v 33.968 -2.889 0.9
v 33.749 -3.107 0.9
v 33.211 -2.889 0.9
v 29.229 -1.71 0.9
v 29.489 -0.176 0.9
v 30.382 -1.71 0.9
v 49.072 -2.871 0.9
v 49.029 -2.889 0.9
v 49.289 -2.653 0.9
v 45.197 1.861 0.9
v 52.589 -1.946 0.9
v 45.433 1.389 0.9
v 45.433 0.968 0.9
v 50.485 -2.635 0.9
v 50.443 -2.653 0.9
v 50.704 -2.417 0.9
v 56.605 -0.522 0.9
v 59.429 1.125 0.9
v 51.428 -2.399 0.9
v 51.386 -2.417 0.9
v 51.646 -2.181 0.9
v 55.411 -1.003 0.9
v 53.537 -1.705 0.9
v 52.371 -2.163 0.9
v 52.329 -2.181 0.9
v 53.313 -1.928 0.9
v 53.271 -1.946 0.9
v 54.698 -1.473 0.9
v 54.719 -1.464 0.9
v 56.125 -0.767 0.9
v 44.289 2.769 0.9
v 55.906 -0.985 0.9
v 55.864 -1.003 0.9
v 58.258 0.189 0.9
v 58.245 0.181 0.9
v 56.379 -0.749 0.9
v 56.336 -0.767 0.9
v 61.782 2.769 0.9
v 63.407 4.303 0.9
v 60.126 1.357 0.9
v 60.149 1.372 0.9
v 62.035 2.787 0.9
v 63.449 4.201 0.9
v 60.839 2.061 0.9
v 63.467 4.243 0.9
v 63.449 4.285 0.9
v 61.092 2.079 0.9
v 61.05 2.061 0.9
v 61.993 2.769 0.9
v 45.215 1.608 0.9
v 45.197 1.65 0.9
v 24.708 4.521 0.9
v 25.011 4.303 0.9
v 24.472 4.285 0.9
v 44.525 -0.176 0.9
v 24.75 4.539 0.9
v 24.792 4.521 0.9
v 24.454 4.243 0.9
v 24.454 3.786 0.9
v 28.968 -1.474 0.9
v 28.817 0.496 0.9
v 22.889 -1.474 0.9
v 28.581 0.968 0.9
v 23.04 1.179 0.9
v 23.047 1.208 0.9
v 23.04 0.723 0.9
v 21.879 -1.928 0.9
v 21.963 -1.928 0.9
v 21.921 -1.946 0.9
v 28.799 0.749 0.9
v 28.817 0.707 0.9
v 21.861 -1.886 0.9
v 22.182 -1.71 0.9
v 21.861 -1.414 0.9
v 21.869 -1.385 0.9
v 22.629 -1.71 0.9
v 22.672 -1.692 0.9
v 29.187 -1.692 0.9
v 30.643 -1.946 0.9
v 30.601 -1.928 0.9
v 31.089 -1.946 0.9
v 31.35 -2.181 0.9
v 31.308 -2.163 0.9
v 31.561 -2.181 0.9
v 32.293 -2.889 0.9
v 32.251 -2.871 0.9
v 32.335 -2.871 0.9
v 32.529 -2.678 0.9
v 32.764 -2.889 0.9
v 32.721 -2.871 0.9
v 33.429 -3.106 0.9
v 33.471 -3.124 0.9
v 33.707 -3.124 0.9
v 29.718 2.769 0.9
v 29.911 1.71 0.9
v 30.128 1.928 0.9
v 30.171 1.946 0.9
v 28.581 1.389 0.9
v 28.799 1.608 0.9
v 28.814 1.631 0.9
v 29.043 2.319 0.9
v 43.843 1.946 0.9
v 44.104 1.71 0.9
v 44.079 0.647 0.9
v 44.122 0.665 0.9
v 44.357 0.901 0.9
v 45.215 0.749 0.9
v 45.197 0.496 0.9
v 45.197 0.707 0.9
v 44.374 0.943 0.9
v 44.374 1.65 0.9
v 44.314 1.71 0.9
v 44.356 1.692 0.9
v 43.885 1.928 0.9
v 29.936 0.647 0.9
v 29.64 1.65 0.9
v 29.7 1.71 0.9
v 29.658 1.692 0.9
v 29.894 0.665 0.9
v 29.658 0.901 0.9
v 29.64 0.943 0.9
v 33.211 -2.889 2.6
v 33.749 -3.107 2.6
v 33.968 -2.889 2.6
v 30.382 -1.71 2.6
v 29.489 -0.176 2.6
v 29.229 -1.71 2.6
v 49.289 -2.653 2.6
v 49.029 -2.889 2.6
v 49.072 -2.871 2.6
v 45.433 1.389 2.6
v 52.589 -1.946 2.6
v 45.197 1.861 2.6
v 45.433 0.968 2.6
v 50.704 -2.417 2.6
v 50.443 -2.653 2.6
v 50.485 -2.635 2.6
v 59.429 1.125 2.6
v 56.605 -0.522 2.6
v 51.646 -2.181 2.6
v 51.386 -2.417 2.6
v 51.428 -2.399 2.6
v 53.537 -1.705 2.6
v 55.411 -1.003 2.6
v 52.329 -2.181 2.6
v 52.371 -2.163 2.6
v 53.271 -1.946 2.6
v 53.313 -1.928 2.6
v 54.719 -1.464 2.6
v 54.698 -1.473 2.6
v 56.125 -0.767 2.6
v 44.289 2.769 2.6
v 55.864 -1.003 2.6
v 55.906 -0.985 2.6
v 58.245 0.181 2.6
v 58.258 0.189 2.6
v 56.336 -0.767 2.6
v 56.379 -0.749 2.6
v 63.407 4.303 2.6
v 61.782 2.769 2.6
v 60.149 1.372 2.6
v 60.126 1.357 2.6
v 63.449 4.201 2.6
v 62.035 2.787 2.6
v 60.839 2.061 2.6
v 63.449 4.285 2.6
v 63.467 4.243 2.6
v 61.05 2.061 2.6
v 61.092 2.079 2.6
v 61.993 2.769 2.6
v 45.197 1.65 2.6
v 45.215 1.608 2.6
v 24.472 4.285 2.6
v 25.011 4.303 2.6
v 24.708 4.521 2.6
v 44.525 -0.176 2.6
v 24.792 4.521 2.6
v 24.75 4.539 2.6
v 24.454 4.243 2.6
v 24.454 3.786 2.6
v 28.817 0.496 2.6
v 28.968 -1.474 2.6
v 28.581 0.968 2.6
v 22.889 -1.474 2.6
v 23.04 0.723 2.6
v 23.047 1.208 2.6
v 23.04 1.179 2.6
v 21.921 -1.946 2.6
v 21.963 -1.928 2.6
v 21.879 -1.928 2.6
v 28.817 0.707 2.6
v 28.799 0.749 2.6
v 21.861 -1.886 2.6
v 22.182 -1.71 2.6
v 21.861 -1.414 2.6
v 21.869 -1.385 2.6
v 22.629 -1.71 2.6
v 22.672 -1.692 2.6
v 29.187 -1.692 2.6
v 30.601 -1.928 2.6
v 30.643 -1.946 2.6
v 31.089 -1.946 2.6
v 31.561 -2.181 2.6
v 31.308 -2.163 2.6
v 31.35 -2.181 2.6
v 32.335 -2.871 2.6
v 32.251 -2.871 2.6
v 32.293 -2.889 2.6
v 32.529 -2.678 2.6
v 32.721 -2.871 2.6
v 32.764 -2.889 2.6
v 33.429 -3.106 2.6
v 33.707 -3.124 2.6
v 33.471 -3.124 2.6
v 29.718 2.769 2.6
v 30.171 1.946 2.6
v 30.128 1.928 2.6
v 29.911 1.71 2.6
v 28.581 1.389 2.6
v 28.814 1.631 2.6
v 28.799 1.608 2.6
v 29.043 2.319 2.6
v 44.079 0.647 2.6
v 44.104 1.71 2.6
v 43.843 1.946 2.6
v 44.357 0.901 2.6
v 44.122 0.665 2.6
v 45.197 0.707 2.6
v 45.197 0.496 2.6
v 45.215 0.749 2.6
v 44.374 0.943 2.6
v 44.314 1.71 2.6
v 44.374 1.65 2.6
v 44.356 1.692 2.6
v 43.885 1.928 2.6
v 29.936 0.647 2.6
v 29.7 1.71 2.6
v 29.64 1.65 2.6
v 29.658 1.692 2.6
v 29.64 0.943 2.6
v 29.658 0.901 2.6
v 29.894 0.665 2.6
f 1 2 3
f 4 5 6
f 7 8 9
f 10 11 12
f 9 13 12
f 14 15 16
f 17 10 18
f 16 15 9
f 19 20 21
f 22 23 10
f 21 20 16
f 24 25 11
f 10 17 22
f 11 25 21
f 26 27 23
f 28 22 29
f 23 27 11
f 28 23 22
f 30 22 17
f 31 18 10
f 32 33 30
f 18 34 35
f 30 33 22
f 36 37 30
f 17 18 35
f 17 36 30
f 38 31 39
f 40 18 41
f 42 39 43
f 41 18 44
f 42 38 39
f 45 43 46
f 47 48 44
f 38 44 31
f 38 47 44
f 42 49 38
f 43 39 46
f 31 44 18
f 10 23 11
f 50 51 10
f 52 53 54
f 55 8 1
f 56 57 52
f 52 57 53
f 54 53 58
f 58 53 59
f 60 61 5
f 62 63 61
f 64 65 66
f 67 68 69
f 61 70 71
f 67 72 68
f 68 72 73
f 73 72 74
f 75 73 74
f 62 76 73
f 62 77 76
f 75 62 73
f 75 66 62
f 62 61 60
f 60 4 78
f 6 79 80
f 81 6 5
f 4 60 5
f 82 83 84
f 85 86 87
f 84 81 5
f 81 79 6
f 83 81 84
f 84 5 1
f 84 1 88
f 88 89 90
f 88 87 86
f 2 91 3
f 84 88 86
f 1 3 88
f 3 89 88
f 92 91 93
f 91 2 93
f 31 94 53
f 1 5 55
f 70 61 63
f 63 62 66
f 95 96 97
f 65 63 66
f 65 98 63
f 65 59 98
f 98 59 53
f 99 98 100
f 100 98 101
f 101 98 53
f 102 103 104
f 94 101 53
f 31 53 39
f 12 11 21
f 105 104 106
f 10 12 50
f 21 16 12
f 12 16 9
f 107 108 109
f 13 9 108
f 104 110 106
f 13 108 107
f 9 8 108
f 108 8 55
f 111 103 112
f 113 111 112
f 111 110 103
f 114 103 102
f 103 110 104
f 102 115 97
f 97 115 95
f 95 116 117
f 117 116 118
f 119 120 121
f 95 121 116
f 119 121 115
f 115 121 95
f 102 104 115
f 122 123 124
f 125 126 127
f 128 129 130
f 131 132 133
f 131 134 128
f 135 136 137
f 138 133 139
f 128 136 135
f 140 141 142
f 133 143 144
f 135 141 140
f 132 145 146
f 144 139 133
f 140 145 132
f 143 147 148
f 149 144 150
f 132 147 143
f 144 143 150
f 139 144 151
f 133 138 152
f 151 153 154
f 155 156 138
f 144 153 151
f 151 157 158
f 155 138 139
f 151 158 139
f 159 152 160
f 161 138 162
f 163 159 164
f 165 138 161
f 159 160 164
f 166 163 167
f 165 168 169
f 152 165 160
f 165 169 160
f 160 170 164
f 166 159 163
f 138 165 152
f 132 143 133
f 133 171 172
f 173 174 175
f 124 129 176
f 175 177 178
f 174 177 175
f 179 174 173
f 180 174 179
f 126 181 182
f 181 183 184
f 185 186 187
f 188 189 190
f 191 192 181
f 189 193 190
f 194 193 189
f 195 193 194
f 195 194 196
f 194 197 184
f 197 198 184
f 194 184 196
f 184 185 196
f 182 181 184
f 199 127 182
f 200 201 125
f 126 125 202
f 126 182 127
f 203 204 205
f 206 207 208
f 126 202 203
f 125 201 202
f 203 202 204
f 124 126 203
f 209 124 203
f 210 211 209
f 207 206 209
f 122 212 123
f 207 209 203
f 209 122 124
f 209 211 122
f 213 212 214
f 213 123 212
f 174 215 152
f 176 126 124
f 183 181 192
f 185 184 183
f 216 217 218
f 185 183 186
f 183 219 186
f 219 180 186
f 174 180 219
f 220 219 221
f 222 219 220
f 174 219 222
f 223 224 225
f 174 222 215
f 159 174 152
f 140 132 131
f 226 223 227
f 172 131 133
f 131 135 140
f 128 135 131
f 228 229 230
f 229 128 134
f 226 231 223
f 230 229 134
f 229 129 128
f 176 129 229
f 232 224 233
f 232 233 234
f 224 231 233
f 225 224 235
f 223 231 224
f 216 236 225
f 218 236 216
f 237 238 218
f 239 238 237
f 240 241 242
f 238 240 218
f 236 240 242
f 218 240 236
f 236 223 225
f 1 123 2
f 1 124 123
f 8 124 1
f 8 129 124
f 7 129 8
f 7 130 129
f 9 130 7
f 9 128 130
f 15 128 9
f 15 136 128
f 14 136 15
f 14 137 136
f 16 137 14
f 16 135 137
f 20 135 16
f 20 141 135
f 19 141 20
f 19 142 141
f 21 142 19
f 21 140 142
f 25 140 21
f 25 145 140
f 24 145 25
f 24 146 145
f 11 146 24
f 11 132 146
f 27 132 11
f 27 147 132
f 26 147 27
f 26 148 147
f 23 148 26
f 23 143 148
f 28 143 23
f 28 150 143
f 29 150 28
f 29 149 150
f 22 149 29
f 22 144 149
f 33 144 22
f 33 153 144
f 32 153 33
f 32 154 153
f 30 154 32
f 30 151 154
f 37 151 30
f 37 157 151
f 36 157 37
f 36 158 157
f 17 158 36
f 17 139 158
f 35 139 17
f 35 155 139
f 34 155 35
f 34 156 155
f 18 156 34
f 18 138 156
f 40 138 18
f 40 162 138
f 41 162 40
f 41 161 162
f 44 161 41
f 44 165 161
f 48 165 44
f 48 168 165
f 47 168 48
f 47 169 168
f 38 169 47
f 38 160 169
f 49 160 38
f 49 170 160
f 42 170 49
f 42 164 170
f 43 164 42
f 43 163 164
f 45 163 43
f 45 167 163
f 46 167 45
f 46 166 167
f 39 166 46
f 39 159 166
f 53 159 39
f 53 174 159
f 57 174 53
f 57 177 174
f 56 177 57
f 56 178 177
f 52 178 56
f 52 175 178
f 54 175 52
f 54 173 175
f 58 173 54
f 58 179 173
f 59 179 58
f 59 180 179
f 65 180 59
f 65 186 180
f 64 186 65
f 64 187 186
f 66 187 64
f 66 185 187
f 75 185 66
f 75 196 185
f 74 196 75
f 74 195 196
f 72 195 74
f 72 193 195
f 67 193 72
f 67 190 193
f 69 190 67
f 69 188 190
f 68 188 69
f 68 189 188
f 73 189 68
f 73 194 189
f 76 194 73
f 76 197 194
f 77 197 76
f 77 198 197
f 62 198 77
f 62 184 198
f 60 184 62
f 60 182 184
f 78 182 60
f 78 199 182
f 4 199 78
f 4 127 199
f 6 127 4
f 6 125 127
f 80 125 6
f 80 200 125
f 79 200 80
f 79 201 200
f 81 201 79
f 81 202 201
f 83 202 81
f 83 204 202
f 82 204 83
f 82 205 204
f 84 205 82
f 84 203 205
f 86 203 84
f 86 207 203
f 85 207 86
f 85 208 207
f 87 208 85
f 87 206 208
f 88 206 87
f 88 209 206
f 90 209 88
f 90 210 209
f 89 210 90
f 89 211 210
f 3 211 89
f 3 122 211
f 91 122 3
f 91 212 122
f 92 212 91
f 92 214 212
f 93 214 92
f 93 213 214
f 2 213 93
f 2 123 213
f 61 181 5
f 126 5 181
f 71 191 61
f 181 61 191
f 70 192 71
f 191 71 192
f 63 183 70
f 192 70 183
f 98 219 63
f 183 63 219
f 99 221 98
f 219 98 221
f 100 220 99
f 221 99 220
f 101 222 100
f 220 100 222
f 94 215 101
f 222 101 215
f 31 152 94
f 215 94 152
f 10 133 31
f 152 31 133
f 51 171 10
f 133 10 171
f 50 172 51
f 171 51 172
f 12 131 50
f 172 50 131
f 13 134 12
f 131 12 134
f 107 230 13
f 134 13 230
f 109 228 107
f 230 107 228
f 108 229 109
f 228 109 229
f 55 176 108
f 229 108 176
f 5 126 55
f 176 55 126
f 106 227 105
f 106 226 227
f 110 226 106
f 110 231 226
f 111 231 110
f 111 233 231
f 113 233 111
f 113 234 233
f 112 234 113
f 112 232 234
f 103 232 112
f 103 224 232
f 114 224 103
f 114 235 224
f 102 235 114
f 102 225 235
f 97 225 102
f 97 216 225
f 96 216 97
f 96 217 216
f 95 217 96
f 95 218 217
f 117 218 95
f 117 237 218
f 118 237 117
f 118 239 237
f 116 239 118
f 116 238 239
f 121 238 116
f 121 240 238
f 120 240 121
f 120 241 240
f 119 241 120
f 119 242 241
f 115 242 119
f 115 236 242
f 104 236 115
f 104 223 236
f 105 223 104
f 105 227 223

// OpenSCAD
$fn = 24;
translate([0, 0.000, 0.900])
  linear_extrude(height=1.700) {
offset(r=0.06, $fn=8) {
    polygon(points=[[29.700,1.650],[29.700,0.943],[29.936,0.707],[44.079,0.707],[44.314,0.943],[44.314,1.650],[44.079,1.650],[43.843,1.886],[30.171,1.886],[29.936,1.650]], paths=[[0,1,2,3,4,5,6,7,8,9]]);
    polygon(points=[[21.921,-1.886],[22.157,-1.650],[22.629,-1.650],[22.864,-1.414],[28.993,-1.414],[29.229,-1.650],[30.407,-1.650],[30.643,-1.886],[31.114,-1.886],[31.350,-2.121],[31.586,-2.121],[32.293,-2.829],[32.529,-2.593],[32.764,-2.829],[33.236,-2.829],[33.471,-3.064],[33.707,-3.064],[33.943,-2.829],[49.029,-2.829],[49.264,-2.593],[50.443,-2.593],[50.679,-2.357],[51.386,-2.357],[51.621,-2.121],[52.329,-2.121],[52.564,-1.886],[53.271,-1.886],[53.507,-1.650],[54.686,-1.414],[55.393,-0.943],[55.864,-0.943],[56.100,-0.707],[56.336,-0.707],[56.571,-0.471],[58.221,0.236],[59.400,1.179],[60.107,1.414],[60.814,2.121],[61.050,2.121],[61.757,2.829],[61.993,2.829],[63.407,4.243],[24.986,4.243],[24.750,4.479],[24.514,4.243],[24.514,3.771],[23.100,1.179],[23.100,0.707],[21.921,-1.414],[28.521,1.414],[28.757,1.650],[28.993,2.357],[29.700,2.829],[44.314,2.829],[45.257,1.886],[45.257,1.650],[45.493,1.414],[45.493,0.943],[45.257,0.707],[45.257,0.471],[44.550,-0.236],[29.464,-0.236],[28.757,0.471],[28.757,0.707],[28.521,0.943]], paths=[[0,1,2,3,4,5,6,7,8,9,10,11,12,13,14,15,16,17,18,19,20,21,22,23,24,25,26,27,28,29,30,31,32,33,34,35,36,37,38,39,40,41,42,43,44,45,46,47,48],[49,50,51,52,53,54,55,56,57,58,59,60,61,62,63,64]]);
}
}
